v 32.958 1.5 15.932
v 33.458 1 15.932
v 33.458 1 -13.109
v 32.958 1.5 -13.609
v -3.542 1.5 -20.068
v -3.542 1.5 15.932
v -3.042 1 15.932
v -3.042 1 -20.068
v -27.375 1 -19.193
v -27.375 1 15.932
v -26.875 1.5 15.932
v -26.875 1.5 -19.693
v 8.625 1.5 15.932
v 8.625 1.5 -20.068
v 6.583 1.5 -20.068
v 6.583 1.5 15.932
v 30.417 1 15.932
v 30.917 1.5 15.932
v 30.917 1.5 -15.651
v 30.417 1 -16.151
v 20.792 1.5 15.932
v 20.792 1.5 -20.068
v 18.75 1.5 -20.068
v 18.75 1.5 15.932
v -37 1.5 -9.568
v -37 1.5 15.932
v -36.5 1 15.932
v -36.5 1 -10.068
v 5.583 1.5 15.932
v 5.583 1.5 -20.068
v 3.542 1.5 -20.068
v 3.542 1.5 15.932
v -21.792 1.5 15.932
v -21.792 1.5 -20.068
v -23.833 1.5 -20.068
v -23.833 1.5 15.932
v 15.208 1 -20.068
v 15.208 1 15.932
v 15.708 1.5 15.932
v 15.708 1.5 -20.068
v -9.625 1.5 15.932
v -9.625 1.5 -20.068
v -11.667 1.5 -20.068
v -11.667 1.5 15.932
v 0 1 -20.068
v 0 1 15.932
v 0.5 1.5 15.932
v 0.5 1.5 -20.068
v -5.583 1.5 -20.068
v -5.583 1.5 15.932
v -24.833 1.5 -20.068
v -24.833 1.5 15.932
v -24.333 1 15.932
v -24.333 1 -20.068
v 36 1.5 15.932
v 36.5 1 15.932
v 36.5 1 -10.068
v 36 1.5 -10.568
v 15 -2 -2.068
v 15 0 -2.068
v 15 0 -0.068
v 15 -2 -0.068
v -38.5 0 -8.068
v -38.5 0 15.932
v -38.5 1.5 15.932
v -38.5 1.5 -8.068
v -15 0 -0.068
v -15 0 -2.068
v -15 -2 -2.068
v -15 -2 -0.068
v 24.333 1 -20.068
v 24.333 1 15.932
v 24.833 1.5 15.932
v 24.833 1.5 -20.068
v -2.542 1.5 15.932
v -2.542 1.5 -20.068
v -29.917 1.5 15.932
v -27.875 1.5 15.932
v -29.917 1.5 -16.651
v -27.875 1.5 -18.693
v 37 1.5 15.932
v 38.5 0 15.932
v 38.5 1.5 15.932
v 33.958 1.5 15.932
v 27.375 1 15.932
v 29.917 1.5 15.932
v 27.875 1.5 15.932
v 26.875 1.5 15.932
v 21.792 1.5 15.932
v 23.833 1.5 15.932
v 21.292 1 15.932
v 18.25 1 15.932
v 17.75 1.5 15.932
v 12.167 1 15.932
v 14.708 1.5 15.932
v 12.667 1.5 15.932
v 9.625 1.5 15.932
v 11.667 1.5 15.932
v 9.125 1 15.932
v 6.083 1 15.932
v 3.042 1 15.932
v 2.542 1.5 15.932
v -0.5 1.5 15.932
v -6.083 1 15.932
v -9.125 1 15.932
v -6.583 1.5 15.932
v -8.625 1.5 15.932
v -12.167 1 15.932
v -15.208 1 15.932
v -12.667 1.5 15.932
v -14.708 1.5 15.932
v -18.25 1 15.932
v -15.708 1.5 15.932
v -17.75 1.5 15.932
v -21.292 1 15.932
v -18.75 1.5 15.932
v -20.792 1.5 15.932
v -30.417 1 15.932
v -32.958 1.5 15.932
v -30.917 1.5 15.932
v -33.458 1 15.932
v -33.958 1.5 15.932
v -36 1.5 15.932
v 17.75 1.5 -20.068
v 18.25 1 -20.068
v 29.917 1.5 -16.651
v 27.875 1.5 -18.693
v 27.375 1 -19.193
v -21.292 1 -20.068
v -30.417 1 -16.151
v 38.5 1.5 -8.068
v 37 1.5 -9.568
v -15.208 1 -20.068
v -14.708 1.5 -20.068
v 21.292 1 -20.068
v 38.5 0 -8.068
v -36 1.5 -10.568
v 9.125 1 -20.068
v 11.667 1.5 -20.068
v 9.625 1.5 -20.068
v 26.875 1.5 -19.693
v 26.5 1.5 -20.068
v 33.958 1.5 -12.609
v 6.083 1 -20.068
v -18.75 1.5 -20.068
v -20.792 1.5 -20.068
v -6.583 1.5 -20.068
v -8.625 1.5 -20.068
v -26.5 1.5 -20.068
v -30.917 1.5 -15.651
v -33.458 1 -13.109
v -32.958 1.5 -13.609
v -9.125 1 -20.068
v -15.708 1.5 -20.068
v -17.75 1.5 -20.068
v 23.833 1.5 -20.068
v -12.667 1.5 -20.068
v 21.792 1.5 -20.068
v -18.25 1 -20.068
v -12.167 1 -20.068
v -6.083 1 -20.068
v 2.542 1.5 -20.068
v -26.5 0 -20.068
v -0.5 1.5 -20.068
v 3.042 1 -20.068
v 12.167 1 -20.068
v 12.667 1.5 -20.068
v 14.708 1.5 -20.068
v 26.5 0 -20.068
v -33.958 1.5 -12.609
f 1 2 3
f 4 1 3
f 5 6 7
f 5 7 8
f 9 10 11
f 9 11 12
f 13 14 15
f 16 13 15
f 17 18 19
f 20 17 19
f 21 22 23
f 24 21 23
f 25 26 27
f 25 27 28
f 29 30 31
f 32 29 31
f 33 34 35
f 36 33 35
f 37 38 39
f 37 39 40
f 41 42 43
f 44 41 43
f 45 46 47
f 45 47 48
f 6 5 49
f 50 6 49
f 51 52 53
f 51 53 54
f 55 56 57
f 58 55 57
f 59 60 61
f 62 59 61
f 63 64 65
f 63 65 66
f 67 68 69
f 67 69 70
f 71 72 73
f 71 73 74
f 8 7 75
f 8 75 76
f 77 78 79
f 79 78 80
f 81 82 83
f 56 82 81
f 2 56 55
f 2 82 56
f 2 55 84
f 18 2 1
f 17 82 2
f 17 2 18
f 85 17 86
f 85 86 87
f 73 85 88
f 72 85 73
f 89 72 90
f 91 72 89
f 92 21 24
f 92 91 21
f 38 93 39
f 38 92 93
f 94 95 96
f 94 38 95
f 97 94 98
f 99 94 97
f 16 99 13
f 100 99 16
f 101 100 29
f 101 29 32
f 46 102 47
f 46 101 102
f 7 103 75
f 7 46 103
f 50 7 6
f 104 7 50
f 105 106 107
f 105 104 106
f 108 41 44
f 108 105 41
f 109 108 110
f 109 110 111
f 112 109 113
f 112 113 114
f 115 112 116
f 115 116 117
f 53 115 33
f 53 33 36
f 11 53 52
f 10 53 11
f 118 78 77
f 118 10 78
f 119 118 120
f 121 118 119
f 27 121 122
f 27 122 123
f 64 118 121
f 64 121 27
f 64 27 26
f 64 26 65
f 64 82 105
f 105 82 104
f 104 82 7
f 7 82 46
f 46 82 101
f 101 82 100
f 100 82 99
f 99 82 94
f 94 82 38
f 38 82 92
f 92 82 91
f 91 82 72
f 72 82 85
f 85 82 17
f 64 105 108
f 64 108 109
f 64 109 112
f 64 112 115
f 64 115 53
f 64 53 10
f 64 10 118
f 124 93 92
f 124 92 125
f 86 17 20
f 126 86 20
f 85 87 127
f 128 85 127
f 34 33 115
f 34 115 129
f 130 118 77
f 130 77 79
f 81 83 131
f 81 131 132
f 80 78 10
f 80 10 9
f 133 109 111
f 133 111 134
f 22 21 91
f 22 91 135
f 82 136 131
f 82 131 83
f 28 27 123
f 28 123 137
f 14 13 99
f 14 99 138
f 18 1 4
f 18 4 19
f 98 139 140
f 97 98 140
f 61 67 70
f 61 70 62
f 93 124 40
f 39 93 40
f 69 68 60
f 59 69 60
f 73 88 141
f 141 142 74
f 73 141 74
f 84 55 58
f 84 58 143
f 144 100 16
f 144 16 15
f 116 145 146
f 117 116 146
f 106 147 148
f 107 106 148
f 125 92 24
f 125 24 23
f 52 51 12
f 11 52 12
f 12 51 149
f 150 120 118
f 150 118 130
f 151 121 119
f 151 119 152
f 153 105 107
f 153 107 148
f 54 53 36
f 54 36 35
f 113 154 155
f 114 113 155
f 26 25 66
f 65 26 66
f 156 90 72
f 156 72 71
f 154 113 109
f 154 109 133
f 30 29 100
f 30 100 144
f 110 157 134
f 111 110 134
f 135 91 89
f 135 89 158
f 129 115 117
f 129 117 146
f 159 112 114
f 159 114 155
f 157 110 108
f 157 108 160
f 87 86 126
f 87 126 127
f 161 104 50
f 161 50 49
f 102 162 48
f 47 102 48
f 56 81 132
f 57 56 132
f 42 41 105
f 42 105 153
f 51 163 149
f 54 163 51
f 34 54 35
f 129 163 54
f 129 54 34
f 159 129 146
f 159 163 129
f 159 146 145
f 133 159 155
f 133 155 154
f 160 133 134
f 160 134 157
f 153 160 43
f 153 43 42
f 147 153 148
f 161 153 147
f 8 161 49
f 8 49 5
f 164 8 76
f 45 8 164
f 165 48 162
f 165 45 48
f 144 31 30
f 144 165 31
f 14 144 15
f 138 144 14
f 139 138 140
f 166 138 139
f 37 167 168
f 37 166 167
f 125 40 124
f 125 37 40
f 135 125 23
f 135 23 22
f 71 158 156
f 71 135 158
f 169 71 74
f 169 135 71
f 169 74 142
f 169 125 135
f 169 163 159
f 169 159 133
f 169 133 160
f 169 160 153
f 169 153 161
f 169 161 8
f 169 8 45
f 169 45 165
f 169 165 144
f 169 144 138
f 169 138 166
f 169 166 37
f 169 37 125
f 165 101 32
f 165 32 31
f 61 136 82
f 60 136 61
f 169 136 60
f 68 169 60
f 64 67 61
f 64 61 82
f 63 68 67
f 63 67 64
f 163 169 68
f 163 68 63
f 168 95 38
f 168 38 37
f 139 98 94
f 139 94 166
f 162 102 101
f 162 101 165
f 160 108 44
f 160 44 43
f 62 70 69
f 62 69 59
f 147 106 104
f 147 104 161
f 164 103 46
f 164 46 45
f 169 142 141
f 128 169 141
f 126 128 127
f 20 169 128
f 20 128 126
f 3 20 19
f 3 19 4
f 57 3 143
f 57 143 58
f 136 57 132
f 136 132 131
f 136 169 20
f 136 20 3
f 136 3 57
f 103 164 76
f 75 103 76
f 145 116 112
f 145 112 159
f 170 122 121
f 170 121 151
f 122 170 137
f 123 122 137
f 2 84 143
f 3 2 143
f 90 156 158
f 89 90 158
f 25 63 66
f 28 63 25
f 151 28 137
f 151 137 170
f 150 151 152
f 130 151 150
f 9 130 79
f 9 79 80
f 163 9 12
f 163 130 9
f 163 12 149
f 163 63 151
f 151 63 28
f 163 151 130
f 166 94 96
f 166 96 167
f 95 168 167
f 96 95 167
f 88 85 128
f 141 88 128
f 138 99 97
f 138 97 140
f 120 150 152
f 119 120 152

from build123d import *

# Parameters (mm, degrees)
BOSS_EXTRUDE1_DEPTH = 1.5
SKETCH2_W           = 1
SKETCH2_H           = 36
CUT_EXTRUDE1_DEPTH  = 0.5
SKETCH3_W           = 30
SKETCH3_H           = 2
BOSS_EXTRUDE2_DEPTH = 2
CHAMFER1_SIZE       = 0.5


with BuildPart() as part:
    # Sketch1 → Boss-Extrude1 (new body)
    with BuildSketch(Plane(origin=(0, 0, 0), x_dir=(1, 0, 0), z_dir=(0, 1, 0))):
        Polygon((-38.5, 8.06761956), (-26.5, 20.06761956), (26.5, 20.06761956), (38.5, 8.06761956), (38.5, -15.93238044), (-38.5, -15.93238044), align=None)
    extrude(amount=BOSS_EXTRUDE1_DEPTH)

    # Sketch2 → Cut-Extrude1 (cut)
    with BuildSketch(Plane(origin=(0, 1.5, 0), x_dir=(1, 0, 0), z_dir=(0, 1, 0))):
        with Locations((-36.5, 2.06761956)):
            Rectangle(SKETCH2_W, SKETCH2_H)
        with Locations((-33.458333333, 2.06761956)):
            Rectangle(SKETCH2_W, SKETCH2_H)
        with Locations((-30.416666667, 2.06761956)):
            Rectangle(SKETCH2_W, SKETCH2_H)
        with Locations((-27.375, 2.06761956)):
            Rectangle(SKETCH2_W, SKETCH2_H)
        with Locations((-24.333333333, 2.06761956)):
            Rectangle(SKETCH2_W, SKETCH2_H)
        with Locations((-21.291666667, 2.06761956)):
            Rectangle(SKETCH2_W, SKETCH2_H)
        with Locations((-18.25, 2.06761956)):
            Rectangle(SKETCH2_W, SKETCH2_H)
        with Locations((-15.208333333, 2.06761956)):
            Rectangle(SKETCH2_W, SKETCH2_H)
        with Locations((-12.166666667, 2.06761956)):
            Rectangle(SKETCH2_W, SKETCH2_H)
        with Locations((-9.125, 2.06761956)):
            Rectangle(SKETCH2_W, SKETCH2_H)
        with Locations((-6.083333333, 2.06761956)):
            Rectangle(SKETCH2_W, SKETCH2_H)
        with Locations((-3.041666667, 2.06761956)):
            Rectangle(SKETCH2_W, SKETCH2_H)
        with Locations((0, 2.06761956)):
            Rectangle(SKETCH2_W, SKETCH2_H)
        with Locations((3.041666667, 2.06761956)):
            Rectangle(SKETCH2_W, SKETCH2_H)
        with Locations((6.083333333, 2.06761956)):
            Rectangle(SKETCH2_W, SKETCH2_H)
        with Locations((9.125, 2.06761956)):
            Rectangle(SKETCH2_W, SKETCH2_H)
        with Locations((12.166666667, 2.06761956)):
            Rectangle(SKETCH2_W, SKETCH2_H)
        with Locations((15.208333333, 2.06761956)):
            Rectangle(SKETCH2_W, SKETCH2_H)
        with Locations((18.25, 2.06761956)):
            Rectangle(SKETCH2_W, SKETCH2_H)
        with Locations((21.291666667, 2.06761956)):
            Rectangle(SKETCH2_W, SKETCH2_H)
        with Locations((24.333333333, 2.06761956)):
            Rectangle(SKETCH2_W, SKETCH2_H)
        with Locations((27.375, 2.06761956)):
            Rectangle(SKETCH2_W, SKETCH2_H)
        with Locations((30.416666667, 2.06761956)):
            Rectangle(SKETCH2_W, SKETCH2_H)
        with Locations((33.458333333, 2.06761956)):
            Rectangle(SKETCH2_W, SKETCH2_H)
        with Locations((36.5, 2.06761956)):
            Rectangle(SKETCH2_W, SKETCH2_H)
    extrude(amount=-CUT_EXTRUDE1_DEPTH, mode=Mode.SUBTRACT)

    # Sketch3 → Boss-Extrude2 (add)
    with BuildSketch(Plane.XZ):
        with Locations((0, -1.06761956)):
            Rectangle(SKETCH3_W, SKETCH3_H)
    extrude(amount=BOSS_EXTRUDE2_DEPTH)

    # Chamfer1
    chamfer1_edges = [part.edges().sort_by_distance(p)[0] for p in [
        (36, 1, 2.68238044),
        (32.958333333, 1, 1.161547107),
        (37, 1, 3.18238044),
        (33.958333333, 1, 1.661547107),
        (30.916666667, 1, 0.140713774),
        (27.875, 1, -1.38011956),
        (24.833333333, 1, -2.06761956),
        (21.791666667, 1, -2.06761956),
        (18.75, 1, -2.06761956),
        (15.708333333, 1, -2.06761956),
        (29.916666667, 1, -0.359286226),
        (26.875, 1, -1.88011956),
        (23.833333333, 1, -2.06761956),
        (20.791666667, 1, -2.06761956),
        (17.75, 1, -2.06761956),
        (14.708333333, 1, -2.06761956),
        (11.666666667, 1, -2.06761956),
        (8.625, 1, -2.06761956),
        (5.583333333, 1, -2.06761956),
        (2.541666667, 1, -2.06761956),
        (12.666666667, 1, -2.06761956),
        (9.625, 1, -2.06761956),
        (6.583333333, 1, -2.06761956),
        (3.541666667, 1, -2.06761956),
        (0.5, 1, -2.06761956),
        (-2.541666667, 1, -2.06761956),
        (-5.583333333, 1, -2.06761956),
        (-8.625, 1, -2.06761956),
        (-11.666666667, 1, -2.06761956),
        (-14.708333333, 1, -2.06761956),
        (-17.75, 1, -2.06761956),
        (-20.791666667, 1, -2.06761956),
        (-0.5, 1, -2.06761956),
        (-3.541666667, 1, -2.06761956),
        (-6.583333333, 1, -2.06761956),
        (-9.625, 1, -2.06761956),
        (-12.666666667, 1, -2.06761956),
        (-15.708333333, 1, -2.06761956),
        (-18.75, 1, -2.06761956),
        (-21.791666667, 1, -2.06761956),
        (-24.833333333, 1, -2.06761956),
        (-27.875, 1, -1.38011956),
        (-23.833333333, 1, -2.06761956),
        (-26.875, 1, -1.88011956),
        (-29.916666667, 1, -0.359286226),
        (-30.916666667, 1, 0.140713774),
        (-33.958333333, 1, 1.661547107),
        (-32.958333333, 1, 1.161547107),
        (-36, 1, 2.68238044),
        (-37, 1, 3.18238044),
    ]]
    chamfer(chamfer1_edges, length=CHAMFER1_SIZE - 0.0001)  # a hair under: the kernel refuses the full size


solid = part.part
